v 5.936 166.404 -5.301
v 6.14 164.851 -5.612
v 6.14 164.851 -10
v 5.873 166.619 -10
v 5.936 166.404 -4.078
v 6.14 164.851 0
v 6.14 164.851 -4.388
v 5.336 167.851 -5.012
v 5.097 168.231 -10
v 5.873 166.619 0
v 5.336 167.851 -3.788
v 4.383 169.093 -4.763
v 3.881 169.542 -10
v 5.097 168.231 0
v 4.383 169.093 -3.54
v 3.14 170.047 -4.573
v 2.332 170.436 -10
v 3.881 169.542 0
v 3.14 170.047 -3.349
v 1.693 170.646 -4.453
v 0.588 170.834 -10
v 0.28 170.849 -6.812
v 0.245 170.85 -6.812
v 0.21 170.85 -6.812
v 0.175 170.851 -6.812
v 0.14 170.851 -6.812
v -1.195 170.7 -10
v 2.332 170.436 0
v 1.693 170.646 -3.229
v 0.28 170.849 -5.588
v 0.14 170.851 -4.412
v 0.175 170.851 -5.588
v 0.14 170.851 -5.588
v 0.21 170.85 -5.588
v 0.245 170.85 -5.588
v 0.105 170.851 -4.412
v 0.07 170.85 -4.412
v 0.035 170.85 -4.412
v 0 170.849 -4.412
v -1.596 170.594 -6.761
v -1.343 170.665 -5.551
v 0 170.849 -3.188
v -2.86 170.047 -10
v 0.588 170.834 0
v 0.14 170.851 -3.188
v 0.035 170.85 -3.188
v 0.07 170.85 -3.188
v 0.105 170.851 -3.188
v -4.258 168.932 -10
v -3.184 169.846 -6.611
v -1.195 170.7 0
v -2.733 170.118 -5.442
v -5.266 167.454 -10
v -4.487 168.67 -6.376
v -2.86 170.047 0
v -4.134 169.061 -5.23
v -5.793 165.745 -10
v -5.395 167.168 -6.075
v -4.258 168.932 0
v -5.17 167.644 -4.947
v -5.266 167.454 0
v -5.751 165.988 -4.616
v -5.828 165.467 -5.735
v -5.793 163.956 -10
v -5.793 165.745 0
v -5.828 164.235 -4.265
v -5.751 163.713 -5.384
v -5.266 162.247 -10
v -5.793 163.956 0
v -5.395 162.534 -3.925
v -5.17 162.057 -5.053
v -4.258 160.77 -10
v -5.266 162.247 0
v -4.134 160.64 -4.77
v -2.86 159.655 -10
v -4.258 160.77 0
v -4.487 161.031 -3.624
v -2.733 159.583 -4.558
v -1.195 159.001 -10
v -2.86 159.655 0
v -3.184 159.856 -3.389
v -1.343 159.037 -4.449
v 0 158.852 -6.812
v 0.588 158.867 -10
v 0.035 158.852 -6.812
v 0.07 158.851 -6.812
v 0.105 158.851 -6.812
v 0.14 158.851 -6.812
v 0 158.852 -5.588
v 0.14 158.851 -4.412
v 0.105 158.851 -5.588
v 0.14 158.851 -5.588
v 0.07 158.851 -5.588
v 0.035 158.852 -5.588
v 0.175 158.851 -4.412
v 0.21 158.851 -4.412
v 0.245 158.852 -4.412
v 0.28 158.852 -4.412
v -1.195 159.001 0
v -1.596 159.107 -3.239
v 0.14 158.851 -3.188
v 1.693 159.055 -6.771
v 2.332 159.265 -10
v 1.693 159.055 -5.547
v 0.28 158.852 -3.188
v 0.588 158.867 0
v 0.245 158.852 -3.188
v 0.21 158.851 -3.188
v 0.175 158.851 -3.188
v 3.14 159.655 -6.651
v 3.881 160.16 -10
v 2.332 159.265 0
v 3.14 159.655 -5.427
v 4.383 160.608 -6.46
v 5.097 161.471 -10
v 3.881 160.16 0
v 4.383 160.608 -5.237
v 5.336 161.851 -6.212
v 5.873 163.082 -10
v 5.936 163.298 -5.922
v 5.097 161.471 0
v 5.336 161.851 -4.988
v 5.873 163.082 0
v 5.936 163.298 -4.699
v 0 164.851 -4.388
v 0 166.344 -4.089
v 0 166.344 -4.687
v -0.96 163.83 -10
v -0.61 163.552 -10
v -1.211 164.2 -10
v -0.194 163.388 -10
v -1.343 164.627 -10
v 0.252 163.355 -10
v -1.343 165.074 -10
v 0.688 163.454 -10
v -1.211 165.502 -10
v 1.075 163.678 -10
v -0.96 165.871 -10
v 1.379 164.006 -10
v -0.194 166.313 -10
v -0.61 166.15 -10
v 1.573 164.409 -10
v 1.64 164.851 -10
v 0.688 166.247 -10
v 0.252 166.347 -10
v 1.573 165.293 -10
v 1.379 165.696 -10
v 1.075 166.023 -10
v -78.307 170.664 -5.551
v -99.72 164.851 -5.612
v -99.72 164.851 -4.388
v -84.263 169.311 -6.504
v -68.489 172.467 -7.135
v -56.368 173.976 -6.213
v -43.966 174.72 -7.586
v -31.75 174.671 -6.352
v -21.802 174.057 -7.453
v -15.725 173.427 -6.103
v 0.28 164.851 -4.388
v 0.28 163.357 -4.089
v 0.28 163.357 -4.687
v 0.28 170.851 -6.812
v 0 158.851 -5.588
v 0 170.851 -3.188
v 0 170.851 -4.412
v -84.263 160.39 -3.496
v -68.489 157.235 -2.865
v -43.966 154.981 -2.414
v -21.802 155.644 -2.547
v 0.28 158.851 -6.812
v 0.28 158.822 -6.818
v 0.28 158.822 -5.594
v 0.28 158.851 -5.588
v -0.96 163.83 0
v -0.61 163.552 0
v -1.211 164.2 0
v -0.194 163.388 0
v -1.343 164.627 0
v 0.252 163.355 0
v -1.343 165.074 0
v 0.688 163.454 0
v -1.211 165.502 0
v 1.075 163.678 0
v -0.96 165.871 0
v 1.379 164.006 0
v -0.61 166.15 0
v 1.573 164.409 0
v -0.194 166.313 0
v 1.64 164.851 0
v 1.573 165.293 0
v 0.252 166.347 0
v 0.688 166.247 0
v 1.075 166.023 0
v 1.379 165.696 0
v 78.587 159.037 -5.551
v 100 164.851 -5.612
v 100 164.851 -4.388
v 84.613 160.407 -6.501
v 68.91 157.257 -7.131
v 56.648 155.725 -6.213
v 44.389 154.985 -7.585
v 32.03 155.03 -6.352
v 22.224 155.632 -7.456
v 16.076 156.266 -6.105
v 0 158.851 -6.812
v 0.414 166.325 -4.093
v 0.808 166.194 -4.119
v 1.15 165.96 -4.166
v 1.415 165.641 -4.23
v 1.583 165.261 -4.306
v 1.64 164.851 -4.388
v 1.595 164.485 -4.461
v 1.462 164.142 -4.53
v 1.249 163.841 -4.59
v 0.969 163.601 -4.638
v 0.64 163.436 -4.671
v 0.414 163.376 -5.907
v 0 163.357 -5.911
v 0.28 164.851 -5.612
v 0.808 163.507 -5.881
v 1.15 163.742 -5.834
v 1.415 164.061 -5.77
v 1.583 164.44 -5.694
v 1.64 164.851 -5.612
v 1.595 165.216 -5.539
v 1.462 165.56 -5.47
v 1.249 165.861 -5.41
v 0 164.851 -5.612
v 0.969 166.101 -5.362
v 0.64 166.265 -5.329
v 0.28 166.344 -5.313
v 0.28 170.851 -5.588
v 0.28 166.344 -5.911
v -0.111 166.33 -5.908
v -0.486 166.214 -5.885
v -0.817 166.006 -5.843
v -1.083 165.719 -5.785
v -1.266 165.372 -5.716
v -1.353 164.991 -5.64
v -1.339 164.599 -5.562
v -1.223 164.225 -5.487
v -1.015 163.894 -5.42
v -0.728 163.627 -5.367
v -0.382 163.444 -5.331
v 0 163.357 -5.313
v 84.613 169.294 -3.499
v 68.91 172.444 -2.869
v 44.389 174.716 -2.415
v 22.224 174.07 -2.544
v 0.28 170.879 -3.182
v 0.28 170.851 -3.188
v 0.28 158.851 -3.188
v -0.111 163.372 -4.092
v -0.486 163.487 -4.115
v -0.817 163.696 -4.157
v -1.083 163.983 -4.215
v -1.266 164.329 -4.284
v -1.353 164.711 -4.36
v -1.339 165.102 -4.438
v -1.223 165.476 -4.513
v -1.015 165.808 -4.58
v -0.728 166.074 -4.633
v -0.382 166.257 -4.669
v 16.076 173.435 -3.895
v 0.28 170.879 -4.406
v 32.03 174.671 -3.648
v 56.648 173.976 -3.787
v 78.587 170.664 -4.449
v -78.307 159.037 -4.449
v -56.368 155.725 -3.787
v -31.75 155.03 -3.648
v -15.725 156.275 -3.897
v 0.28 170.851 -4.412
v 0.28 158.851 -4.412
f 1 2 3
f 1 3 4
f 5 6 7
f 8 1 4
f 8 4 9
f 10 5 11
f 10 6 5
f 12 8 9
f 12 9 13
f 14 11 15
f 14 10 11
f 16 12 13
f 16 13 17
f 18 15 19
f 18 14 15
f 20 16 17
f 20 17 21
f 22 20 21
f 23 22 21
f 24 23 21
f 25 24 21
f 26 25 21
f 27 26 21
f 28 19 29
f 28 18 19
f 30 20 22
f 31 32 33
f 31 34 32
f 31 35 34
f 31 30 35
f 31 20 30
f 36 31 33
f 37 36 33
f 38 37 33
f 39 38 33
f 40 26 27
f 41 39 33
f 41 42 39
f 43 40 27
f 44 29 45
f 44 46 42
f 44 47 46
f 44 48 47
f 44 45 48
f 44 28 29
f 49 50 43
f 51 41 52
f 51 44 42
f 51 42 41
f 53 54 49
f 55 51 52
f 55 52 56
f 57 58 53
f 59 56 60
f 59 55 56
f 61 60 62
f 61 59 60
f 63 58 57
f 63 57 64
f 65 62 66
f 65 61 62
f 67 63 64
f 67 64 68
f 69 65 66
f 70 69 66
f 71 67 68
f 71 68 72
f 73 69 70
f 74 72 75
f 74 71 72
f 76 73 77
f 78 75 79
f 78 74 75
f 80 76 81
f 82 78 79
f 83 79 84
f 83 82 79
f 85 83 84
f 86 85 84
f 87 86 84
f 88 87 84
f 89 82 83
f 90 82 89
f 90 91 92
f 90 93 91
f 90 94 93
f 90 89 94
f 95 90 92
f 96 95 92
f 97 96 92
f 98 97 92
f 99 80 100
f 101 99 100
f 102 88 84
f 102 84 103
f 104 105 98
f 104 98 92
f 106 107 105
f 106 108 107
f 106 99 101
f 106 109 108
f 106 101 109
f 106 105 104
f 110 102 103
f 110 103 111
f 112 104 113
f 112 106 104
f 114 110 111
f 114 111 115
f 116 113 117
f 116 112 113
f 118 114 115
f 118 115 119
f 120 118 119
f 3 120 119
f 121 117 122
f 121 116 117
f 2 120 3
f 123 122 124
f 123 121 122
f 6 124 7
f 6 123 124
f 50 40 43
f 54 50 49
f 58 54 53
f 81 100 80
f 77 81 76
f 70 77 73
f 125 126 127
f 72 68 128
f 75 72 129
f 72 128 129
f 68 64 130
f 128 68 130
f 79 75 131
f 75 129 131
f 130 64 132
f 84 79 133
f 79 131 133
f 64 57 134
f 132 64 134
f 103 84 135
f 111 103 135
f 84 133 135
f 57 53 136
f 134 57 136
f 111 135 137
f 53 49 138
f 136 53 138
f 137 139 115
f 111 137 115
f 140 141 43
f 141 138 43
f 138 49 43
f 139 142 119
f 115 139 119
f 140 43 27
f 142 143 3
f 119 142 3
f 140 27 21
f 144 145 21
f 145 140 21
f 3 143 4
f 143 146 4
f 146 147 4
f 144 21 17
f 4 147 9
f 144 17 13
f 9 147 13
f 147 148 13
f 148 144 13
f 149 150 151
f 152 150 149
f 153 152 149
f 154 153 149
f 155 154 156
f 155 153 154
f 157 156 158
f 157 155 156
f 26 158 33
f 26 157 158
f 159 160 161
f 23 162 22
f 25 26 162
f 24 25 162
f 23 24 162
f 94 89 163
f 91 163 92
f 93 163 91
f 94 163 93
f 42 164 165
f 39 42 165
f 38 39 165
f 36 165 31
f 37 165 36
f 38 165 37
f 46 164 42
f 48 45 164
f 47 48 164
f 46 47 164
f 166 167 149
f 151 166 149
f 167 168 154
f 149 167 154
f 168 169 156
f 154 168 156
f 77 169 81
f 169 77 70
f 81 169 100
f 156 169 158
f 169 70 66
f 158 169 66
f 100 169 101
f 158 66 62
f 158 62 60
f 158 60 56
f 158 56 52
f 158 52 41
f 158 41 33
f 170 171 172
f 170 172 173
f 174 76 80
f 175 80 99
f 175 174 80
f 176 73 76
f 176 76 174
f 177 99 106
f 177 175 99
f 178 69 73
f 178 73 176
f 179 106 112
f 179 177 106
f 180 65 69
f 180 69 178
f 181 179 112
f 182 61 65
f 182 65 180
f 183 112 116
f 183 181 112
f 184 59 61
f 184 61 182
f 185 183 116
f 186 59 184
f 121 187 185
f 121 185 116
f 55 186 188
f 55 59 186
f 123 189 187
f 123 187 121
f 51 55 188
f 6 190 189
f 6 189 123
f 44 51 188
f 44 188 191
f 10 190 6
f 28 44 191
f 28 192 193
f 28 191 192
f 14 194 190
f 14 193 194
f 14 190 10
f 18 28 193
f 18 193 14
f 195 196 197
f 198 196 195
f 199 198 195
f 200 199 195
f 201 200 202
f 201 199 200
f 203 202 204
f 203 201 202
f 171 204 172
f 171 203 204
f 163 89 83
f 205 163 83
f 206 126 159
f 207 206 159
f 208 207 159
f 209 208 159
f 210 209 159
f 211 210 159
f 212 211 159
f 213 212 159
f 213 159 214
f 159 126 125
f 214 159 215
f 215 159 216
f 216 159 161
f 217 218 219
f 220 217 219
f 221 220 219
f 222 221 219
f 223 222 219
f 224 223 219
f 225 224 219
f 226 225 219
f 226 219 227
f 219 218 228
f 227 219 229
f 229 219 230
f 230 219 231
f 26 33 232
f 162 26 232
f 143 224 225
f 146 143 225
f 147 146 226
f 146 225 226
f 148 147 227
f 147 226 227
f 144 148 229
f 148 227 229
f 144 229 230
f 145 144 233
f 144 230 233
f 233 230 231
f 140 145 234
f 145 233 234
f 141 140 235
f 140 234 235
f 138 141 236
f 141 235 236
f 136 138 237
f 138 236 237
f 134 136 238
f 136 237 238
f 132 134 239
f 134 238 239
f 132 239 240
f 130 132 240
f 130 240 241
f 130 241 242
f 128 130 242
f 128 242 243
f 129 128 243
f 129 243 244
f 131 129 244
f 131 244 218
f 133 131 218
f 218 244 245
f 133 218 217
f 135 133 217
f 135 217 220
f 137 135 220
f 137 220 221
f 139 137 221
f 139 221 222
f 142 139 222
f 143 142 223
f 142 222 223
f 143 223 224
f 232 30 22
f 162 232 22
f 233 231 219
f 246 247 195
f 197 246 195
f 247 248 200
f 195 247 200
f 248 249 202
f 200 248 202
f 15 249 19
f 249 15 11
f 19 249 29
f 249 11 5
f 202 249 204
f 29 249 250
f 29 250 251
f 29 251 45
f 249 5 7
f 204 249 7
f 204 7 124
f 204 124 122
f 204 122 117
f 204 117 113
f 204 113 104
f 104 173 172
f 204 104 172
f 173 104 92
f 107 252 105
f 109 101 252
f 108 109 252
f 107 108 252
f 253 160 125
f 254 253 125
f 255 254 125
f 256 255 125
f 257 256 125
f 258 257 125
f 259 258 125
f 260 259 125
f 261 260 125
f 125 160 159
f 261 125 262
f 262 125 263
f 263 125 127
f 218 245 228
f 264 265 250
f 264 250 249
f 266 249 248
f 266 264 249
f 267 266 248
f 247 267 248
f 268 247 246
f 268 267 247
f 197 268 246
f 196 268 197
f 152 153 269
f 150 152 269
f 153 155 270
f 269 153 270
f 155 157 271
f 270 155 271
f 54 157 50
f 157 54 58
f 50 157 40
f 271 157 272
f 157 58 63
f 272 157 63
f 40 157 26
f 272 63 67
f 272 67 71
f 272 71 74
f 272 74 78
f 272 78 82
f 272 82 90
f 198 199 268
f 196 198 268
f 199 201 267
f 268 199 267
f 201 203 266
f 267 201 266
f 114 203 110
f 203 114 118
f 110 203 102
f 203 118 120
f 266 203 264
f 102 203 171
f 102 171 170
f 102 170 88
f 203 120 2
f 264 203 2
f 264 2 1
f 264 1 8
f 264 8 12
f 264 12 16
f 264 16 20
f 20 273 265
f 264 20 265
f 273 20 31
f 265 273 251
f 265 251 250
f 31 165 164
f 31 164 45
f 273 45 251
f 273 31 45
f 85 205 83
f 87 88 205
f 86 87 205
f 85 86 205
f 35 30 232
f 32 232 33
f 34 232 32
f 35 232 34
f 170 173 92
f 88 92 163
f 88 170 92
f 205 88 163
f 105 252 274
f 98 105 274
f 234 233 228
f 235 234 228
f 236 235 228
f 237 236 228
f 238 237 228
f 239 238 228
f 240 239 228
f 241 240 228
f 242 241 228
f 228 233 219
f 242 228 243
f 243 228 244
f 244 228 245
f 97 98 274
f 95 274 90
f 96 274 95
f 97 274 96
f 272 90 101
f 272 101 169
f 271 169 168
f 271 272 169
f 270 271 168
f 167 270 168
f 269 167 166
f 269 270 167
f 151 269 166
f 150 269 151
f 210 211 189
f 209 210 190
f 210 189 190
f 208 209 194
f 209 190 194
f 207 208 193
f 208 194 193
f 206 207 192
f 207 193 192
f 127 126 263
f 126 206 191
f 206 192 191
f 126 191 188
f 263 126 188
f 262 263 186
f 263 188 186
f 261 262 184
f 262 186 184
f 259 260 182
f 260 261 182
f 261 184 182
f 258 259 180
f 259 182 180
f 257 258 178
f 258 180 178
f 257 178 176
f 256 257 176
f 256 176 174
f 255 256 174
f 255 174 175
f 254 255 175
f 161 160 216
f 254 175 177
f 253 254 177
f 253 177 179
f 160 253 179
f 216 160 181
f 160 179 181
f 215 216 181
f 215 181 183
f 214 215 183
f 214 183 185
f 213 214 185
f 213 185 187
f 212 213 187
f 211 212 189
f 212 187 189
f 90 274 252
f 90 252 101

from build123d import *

# Parameters (mm, degrees)
SKETCH1_R           = 6.000000000000002
SKETCH1_R_2         = 1.4999999999999918
BOSS_EXTRUDE1_DEPTH = 10
BOSS_EXTRUDE2_DEPTH = 125
CUT_EXTRUDE1_START  = -10.588348405
CUT_EXTRUDE1_DEPTH  = 11.17669681
CIRPATTERN1_COUNT   = 2


# Read off the part's stored shape, not the designer's step: Cut-Extrude1
with BuildPart() as part:
    # Sketch1 → Boss-Extrude1 (new body)
    with BuildSketch(Plane.XY):
        with Locations((0.1399887701091363, 164.8507075610879)):
            Circle(SKETCH1_R)
        with Locations((0.1399887701091363, 164.8507075610879)):
            Circle(SKETCH1_R_2, mode=Mode.SUBTRACT)
    extrude(amount=-BOSS_EXTRUDE1_DEPTH)

    # Sketch2 → Boss-Extrude2 (add)
    with BuildSketch(Plane(origin=(0, 0, 0), x_dir=(0, 0, -1), z_dir=(1, 0, 0))):
        Polygon((-0.5883484054145544, 189.73303788000499), (9.411651594585447, 139.73303788000499), (10.58834840541455, 139.9683772421708), (0.5883484054145496, 189.9683772421708), align=None)
    boss_extrude2 = extrude(amount=BOSS_EXTRUDE2_DEPTH)

    # Cut-Extrude1 outline → Cut-Extrude1 (cut)
    with BuildSketch(Plane.XY.offset(CUT_EXTRUDE1_START)):
        with BuildLine():
            Line((0, 170.850707561), (0.13998877, 170.850707561))
            ThreePointArc((0.13998877, 170.850707561), (50.466362146, 174.447589067), (100, 164.850707561))
            ThreePointArc((100, 164.850707561), (50.466362146, 155.253826055), (0.13998877, 158.850707561))
            Line((0.13998877, 158.850707561), (0, 158.850707561))
            Line((0, 158.850707561), (0, 131.123594735))
            Line((0, 131.123594735), (135.475544018, 131.123594735))
            Line((135.475544018, 131.123594735), (135.475544018, 197.042094646))
            Line((135.475544018, 197.042094646), (0, 197.042094646))
            Line((0, 197.042094646), (0, 170.850707561))
        make_face()
    cut_extrude1 = extrude(amount=CUT_EXTRUDE1_DEPTH, mode=Mode.SUBTRACT)

    # CirPattern1: Boss-Extrude2, Cut-Extrude1 ×2 about axis
    cirpattern1_axis = Axis((0.1399887701089445, 164.85070756108797, 0), (0, 0, 1))
    add([boss_extrude2.rotate(cirpattern1_axis, i * 360 / CIRPATTERN1_COUNT) for i in range(1, CIRPATTERN1_COUNT)])
    add([cut_extrude1.rotate(cirpattern1_axis, i * 360 / CIRPATTERN1_COUNT) for i in range(1, CIRPATTERN1_COUNT)], mode=Mode.SUBTRACT)


solid = part.part
